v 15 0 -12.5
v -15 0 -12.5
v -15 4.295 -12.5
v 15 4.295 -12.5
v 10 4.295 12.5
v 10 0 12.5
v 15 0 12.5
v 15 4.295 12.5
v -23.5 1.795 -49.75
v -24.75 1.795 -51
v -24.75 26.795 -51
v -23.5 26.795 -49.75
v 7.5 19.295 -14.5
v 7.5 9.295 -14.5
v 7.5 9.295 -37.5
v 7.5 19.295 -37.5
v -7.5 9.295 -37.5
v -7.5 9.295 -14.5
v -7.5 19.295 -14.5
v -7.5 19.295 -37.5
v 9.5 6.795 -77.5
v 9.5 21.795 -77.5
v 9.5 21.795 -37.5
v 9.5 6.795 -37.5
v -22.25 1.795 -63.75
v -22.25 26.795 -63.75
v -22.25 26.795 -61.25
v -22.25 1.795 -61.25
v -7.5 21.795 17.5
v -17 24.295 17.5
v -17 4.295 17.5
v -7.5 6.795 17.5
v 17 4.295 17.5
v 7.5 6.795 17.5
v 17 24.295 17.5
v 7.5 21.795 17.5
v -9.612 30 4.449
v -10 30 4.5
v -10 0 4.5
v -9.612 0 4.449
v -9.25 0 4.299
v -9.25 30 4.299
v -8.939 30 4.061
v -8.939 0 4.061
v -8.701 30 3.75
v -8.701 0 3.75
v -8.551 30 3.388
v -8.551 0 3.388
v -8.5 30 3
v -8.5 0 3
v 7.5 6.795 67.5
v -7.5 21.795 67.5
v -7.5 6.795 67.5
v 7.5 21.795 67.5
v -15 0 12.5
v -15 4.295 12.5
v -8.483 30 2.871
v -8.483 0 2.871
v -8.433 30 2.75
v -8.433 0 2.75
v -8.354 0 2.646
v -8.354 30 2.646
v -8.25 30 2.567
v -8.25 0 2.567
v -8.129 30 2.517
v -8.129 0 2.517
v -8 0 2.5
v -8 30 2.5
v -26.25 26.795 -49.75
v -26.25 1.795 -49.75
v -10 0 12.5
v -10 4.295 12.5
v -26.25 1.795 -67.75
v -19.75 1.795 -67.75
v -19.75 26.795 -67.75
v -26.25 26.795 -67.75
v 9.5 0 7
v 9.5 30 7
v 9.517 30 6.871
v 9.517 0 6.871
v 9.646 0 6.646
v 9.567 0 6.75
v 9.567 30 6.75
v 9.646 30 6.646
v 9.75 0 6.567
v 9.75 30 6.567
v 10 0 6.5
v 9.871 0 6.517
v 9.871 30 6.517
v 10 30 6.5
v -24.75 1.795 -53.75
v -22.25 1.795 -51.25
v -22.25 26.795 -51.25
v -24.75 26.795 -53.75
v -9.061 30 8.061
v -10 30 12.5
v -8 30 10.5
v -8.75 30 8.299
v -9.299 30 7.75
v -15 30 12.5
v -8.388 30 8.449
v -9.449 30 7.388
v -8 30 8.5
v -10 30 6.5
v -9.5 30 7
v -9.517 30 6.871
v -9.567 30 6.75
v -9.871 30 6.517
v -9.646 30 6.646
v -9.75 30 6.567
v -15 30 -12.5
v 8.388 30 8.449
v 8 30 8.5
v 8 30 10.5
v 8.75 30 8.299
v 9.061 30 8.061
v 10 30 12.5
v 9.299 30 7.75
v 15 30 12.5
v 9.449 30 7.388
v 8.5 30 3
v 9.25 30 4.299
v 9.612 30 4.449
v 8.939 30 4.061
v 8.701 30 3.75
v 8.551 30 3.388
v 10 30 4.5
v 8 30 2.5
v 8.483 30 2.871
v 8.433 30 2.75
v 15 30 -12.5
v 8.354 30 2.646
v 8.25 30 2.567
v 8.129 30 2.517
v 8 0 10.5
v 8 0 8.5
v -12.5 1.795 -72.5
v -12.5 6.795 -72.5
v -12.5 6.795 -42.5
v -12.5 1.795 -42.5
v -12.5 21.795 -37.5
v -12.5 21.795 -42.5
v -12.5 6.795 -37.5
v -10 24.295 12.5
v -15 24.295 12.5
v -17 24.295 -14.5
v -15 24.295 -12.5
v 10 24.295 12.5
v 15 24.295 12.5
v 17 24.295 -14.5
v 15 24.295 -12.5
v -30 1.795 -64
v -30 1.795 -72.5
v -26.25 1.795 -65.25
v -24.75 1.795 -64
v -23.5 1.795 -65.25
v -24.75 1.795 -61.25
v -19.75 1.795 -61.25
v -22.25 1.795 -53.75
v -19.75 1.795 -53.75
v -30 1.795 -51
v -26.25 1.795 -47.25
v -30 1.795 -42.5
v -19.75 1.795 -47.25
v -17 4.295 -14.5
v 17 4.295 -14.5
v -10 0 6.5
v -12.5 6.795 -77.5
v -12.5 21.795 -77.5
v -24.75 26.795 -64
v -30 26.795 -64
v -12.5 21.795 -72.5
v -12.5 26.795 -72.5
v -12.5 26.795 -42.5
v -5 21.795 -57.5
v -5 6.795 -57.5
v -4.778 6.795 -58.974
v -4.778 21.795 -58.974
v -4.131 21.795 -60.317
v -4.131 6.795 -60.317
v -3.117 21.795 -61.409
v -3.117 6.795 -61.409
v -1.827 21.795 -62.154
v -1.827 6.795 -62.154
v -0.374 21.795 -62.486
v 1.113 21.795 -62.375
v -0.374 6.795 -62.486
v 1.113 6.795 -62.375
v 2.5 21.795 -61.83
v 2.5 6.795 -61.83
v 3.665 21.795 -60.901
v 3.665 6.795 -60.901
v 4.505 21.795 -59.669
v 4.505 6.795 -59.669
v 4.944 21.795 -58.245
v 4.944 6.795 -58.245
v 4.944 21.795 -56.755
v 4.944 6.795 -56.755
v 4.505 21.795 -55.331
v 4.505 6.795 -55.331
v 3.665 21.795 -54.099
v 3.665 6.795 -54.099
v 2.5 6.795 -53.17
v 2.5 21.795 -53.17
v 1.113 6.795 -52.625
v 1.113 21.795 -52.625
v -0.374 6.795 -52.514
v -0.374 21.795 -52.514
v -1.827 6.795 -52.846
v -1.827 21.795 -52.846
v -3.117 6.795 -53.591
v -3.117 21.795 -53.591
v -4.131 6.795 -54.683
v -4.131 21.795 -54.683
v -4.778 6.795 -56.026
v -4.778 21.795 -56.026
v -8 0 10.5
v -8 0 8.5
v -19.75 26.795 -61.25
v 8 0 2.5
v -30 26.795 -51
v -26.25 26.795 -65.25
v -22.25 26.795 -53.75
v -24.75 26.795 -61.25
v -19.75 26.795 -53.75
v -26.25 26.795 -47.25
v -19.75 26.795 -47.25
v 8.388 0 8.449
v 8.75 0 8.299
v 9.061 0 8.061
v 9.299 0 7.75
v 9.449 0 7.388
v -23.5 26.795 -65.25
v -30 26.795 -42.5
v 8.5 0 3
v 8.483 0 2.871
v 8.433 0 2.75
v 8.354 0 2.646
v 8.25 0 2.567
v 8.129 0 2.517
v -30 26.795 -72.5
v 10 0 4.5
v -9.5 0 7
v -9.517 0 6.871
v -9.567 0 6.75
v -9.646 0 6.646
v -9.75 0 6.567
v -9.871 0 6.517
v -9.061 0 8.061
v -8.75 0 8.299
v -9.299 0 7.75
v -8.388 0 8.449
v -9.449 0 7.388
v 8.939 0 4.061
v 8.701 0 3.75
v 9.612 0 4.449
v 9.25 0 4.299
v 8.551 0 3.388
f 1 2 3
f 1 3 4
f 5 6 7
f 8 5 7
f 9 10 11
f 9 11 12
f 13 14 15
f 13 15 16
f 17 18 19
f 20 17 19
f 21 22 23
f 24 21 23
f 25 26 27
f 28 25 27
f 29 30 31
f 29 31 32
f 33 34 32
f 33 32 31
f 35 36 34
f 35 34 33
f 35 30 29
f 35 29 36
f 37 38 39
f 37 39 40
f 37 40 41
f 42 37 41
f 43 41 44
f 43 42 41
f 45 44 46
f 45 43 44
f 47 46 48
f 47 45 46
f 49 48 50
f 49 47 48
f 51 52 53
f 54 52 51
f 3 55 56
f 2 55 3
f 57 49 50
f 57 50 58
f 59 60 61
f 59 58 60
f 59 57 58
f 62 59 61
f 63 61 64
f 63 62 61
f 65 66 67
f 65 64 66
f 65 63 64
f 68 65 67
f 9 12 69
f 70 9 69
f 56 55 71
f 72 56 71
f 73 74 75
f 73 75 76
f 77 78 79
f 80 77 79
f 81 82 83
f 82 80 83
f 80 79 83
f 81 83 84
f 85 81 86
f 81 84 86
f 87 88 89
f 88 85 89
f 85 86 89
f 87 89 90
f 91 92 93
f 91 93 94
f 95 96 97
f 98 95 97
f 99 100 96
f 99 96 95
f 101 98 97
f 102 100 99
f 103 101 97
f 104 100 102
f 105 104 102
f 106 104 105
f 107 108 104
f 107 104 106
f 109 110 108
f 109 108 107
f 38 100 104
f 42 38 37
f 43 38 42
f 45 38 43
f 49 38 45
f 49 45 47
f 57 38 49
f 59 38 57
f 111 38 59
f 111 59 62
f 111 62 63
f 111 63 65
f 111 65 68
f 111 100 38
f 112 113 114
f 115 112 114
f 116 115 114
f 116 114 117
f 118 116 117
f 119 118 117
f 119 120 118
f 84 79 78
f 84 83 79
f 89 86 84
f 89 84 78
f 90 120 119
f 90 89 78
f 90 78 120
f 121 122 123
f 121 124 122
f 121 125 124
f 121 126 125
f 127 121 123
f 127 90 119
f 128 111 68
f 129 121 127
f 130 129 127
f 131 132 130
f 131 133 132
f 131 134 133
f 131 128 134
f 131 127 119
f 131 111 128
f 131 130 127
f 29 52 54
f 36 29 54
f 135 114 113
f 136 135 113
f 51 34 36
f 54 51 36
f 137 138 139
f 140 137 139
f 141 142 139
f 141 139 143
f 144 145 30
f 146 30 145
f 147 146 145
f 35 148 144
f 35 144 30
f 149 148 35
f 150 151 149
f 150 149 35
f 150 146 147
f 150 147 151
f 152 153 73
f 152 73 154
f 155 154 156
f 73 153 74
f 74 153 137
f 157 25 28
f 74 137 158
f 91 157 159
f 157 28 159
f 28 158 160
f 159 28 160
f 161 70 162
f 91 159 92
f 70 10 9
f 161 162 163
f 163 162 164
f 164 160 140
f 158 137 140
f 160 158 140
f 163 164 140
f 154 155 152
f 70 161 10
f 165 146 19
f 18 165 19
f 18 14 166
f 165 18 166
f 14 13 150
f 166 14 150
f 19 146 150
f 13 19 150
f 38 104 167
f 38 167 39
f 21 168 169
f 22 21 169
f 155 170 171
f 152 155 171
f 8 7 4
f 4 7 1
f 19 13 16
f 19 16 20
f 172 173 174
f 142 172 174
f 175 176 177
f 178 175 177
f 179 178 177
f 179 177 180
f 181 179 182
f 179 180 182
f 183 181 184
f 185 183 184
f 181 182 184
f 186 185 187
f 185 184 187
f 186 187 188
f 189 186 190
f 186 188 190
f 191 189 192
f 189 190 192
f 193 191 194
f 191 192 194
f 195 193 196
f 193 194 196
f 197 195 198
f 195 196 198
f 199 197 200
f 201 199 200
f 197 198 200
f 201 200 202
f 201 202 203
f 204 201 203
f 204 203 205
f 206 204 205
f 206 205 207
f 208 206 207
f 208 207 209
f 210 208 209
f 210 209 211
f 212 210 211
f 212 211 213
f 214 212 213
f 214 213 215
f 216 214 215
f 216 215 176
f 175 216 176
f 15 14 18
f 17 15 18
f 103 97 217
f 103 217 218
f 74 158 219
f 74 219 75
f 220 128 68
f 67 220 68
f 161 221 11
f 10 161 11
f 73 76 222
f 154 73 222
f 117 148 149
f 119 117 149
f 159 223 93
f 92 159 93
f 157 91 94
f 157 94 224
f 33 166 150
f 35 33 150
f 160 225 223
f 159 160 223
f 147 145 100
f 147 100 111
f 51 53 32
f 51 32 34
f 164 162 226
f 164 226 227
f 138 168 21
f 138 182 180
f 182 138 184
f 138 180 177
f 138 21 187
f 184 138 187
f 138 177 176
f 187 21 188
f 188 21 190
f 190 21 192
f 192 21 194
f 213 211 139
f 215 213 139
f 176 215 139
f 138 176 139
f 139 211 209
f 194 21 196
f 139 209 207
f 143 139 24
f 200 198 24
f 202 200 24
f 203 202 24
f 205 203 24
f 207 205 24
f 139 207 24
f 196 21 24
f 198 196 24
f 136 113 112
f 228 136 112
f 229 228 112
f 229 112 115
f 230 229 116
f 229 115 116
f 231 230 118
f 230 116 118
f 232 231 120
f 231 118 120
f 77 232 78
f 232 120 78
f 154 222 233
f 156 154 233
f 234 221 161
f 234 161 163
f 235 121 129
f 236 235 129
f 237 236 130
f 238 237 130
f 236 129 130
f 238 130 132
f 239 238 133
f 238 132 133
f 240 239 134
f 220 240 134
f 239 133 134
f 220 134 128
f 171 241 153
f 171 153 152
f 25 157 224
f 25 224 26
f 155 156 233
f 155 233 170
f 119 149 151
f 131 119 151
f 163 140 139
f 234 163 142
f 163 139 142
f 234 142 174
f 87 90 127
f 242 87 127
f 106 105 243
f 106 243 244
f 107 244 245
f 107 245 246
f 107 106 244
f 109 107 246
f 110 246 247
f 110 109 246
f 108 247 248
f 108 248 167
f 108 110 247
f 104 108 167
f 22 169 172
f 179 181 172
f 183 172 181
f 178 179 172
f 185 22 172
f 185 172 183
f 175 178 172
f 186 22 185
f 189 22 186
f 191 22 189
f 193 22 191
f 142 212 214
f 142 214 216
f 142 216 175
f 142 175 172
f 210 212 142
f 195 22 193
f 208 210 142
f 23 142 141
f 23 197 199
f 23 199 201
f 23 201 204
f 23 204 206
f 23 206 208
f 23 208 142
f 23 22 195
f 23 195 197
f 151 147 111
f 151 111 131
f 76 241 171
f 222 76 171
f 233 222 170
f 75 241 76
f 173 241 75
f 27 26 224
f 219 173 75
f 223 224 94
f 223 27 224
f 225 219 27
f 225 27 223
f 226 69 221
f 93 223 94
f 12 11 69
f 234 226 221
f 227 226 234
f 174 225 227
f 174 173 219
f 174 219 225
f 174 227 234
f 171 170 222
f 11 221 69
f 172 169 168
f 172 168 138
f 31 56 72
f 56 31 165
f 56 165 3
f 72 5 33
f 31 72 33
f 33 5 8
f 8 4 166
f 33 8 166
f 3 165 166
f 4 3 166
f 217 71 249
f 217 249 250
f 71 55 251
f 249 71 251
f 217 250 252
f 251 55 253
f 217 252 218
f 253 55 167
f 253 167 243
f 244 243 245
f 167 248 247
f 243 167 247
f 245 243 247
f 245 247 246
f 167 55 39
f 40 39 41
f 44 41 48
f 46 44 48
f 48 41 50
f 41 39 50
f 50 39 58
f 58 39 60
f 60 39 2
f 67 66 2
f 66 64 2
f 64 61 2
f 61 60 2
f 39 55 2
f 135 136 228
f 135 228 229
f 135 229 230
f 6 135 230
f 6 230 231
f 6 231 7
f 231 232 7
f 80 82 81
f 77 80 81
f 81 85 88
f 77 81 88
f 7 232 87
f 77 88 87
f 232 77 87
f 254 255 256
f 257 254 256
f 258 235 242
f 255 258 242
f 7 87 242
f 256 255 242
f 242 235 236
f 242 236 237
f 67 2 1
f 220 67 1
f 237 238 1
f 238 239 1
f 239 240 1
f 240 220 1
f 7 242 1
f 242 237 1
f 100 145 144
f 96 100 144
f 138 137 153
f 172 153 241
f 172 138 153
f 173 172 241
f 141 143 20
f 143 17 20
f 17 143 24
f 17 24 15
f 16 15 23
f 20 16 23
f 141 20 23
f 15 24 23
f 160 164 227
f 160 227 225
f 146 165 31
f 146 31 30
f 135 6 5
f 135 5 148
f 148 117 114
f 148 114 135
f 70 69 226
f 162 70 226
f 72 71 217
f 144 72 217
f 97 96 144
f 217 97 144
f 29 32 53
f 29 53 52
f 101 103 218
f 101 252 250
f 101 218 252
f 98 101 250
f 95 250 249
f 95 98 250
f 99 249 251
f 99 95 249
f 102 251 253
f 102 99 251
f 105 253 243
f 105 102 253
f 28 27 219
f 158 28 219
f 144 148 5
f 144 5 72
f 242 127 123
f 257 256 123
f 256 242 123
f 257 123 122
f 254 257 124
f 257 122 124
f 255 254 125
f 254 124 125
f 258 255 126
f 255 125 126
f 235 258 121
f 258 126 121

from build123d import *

# Parameters (mm, degrees)
SKETCH3_W                = 30
SKETCH3_H                = 25
BASETOPPLANE_DEPTH       = 30
BOSS_EXTRUDE1_DEPTH      = 5
BOSS_EXTRUDE1_DEPTH_BACK = 27
SKETCH6_W                = 34
SKETCH6_H                = 20
CUT_EXTRUDE1_DEPTH       = 39.668462602
SKETCH7_W                = 15
SKETCH7_H                = 10
BACKBAR_DEPTH            = 60
SIDECONNECT_DEPTH        = 5
SIDECONNECT_DEPTH_BACK   = 17
SKETCH8_W                = 40
SKETCH8_H                = 15
SKETCH9_W                = 30
SKETCH9_H                = 25
SIDESLIDER_DEPTH         = 17.5
MOUNTINGCUT_DEPTH        = 88.316641384
DRILLFORMOVEMENT_D       = 10
SKETCH17_W               = 15
SKETCH17_H               = 15
FRONTBAR_DEPTH           = 50


with BuildPart() as part:
    # Sketch3 → baseTopPlane (new body)
    with BuildSketch(Plane(origin=(0, 0, 0), x_dir=(1, 0, 0), z_dir=(0, 1, 0))):
        Rectangle(SKETCH3_W, SKETCH3_H)
    extrude(amount=BASETOPPLANE_DEPTH)

    # Sketch6 → Boss-Extrude1 (add, two sides: drawn at the far end of the back side and taken through both)
    with BuildSketch(Plane.XY.offset(12.5).offset(-BOSS_EXTRUDE1_DEPTH_BACK)):
        with Locations((0, 14.294511799)):
            Rectangle(SKETCH6_W, SKETCH6_H)
    extrude(amount=BOSS_EXTRUDE1_DEPTH + BOSS_EXTRUDE1_DEPTH_BACK)

    # Sketch4 → Cut-Extrude1 (cut, through all)
    with BuildSketch(Plane(origin=(0, 30, 0), x_dir=(1, 0, 0), z_dir=(0, 1, 0))):
        with BuildLine():
            Line((0, -12.5), (10, -12.5))
            Line((10, -12.5), (8, -10.5))
            Line((8, -10.5), (8, -8.5))
            ThreePointArc((8, -8.5), (9.060660172, -8.060660172), (9.5, -7))
            ThreePointArc((9.5, -7), (9.646446609, -6.646446609), (10, -6.5))
            Line((10, -6.5), (10, -4.5))
            ThreePointArc((10, -4.5), (8.939339828, -4.060660172), (8.5, -3))
            ThreePointArc((8.5, -3), (8.353553391, -2.646446609), (8, -2.5))
            Line((8, -2.5), (0, -2.5))
            Line((0, -2.5), (0, -12.5))
        make_face()
    cut_extrude1 = extrude(amount=-CUT_EXTRUDE1_DEPTH, mode=Mode.SUBTRACT)

    # Mirror1: Cut-Extrude1 across plane
    add(cut_extrude1.mirror(Plane(origin=(0, 0, 2.5), x_dir=(0, 0, 1), z_dir=(-1, 0, 0))), mode=Mode.SUBTRACT)

    # Sketch7 → BackBar (add)
    with BuildSketch(Plane(origin=(0, 0, -14.5), x_dir=(-1, 0, 0), z_dir=(0, 0, -1))):
        with Locations((0, 14.294511799)):
            Rectangle(SKETCH7_W, SKETCH7_H)
    extrude(amount=BACKBAR_DEPTH)

    # Sketch8 → sideConnect (add, two sides: drawn at the far end of the back side and taken through both)
    with BuildSketch(Plane.ZY.offset(7.5).offset(-SIDECONNECT_DEPTH_BACK)):
        with Locations((-57.5, 14.294511799)):
            Rectangle(SKETCH8_W, SKETCH8_H)
    extrude(amount=SIDECONNECT_DEPTH + SIDECONNECT_DEPTH_BACK)

    # Sketch9 → sideSlider (add)
    with BuildSketch(Plane.ZY.offset(12.5)):
        with Locations((-57.5, 14.294511799)):
            Rectangle(SKETCH9_W, SKETCH9_H)
    extrude(amount=SIDESLIDER_DEPTH)

    # Sketch13 → mountingCut (cut, through all)
    with BuildSketch(Plane(origin=(0, 26.794511799, 0), x_dir=(1, 0, 0), z_dir=(0, 1, 0))):
        Polygon((-30, 64), (-30, 51), (-24.75, 51), (-23.5, 49.75), (-26.25, 49.75), (-26.25, 47.25), (-19.75, 47.25), (-19.75, 53.75), (-22.25, 53.75), (-22.25, 51.25), (-24.75, 53.75), (-24.75, 61.25), (-22.25, 63.75), (-22.25, 61.25), (-19.75, 61.25), (-19.75, 67.75), (-26.25, 67.75), (-26.25, 65.25), (-23.5, 65.25), (-24.75, 64), align=None)
    extrude(amount=-MOUNTINGCUT_DEPTH, mode=Mode.SUBTRACT)

    # DrillforMovement (through all)
    with Locations(Plane(origin=(0, 21.794511799, 0), x_dir=(1, 0, 0), z_dir=(0, 1, 0))):
        with Locations((0, 57.5)):
            Hole(DRILLFORMOVEMENT_D / 2)

    # Sketch17 → frontBar (add)
    with BuildSketch(Plane.XY.offset(17.5)):
        with Locations((0, 14.294511799)):
            Rectangle(SKETCH17_W, SKETCH17_H)
    extrude(amount=FRONTBAR_DEPTH)


solid = part.part
